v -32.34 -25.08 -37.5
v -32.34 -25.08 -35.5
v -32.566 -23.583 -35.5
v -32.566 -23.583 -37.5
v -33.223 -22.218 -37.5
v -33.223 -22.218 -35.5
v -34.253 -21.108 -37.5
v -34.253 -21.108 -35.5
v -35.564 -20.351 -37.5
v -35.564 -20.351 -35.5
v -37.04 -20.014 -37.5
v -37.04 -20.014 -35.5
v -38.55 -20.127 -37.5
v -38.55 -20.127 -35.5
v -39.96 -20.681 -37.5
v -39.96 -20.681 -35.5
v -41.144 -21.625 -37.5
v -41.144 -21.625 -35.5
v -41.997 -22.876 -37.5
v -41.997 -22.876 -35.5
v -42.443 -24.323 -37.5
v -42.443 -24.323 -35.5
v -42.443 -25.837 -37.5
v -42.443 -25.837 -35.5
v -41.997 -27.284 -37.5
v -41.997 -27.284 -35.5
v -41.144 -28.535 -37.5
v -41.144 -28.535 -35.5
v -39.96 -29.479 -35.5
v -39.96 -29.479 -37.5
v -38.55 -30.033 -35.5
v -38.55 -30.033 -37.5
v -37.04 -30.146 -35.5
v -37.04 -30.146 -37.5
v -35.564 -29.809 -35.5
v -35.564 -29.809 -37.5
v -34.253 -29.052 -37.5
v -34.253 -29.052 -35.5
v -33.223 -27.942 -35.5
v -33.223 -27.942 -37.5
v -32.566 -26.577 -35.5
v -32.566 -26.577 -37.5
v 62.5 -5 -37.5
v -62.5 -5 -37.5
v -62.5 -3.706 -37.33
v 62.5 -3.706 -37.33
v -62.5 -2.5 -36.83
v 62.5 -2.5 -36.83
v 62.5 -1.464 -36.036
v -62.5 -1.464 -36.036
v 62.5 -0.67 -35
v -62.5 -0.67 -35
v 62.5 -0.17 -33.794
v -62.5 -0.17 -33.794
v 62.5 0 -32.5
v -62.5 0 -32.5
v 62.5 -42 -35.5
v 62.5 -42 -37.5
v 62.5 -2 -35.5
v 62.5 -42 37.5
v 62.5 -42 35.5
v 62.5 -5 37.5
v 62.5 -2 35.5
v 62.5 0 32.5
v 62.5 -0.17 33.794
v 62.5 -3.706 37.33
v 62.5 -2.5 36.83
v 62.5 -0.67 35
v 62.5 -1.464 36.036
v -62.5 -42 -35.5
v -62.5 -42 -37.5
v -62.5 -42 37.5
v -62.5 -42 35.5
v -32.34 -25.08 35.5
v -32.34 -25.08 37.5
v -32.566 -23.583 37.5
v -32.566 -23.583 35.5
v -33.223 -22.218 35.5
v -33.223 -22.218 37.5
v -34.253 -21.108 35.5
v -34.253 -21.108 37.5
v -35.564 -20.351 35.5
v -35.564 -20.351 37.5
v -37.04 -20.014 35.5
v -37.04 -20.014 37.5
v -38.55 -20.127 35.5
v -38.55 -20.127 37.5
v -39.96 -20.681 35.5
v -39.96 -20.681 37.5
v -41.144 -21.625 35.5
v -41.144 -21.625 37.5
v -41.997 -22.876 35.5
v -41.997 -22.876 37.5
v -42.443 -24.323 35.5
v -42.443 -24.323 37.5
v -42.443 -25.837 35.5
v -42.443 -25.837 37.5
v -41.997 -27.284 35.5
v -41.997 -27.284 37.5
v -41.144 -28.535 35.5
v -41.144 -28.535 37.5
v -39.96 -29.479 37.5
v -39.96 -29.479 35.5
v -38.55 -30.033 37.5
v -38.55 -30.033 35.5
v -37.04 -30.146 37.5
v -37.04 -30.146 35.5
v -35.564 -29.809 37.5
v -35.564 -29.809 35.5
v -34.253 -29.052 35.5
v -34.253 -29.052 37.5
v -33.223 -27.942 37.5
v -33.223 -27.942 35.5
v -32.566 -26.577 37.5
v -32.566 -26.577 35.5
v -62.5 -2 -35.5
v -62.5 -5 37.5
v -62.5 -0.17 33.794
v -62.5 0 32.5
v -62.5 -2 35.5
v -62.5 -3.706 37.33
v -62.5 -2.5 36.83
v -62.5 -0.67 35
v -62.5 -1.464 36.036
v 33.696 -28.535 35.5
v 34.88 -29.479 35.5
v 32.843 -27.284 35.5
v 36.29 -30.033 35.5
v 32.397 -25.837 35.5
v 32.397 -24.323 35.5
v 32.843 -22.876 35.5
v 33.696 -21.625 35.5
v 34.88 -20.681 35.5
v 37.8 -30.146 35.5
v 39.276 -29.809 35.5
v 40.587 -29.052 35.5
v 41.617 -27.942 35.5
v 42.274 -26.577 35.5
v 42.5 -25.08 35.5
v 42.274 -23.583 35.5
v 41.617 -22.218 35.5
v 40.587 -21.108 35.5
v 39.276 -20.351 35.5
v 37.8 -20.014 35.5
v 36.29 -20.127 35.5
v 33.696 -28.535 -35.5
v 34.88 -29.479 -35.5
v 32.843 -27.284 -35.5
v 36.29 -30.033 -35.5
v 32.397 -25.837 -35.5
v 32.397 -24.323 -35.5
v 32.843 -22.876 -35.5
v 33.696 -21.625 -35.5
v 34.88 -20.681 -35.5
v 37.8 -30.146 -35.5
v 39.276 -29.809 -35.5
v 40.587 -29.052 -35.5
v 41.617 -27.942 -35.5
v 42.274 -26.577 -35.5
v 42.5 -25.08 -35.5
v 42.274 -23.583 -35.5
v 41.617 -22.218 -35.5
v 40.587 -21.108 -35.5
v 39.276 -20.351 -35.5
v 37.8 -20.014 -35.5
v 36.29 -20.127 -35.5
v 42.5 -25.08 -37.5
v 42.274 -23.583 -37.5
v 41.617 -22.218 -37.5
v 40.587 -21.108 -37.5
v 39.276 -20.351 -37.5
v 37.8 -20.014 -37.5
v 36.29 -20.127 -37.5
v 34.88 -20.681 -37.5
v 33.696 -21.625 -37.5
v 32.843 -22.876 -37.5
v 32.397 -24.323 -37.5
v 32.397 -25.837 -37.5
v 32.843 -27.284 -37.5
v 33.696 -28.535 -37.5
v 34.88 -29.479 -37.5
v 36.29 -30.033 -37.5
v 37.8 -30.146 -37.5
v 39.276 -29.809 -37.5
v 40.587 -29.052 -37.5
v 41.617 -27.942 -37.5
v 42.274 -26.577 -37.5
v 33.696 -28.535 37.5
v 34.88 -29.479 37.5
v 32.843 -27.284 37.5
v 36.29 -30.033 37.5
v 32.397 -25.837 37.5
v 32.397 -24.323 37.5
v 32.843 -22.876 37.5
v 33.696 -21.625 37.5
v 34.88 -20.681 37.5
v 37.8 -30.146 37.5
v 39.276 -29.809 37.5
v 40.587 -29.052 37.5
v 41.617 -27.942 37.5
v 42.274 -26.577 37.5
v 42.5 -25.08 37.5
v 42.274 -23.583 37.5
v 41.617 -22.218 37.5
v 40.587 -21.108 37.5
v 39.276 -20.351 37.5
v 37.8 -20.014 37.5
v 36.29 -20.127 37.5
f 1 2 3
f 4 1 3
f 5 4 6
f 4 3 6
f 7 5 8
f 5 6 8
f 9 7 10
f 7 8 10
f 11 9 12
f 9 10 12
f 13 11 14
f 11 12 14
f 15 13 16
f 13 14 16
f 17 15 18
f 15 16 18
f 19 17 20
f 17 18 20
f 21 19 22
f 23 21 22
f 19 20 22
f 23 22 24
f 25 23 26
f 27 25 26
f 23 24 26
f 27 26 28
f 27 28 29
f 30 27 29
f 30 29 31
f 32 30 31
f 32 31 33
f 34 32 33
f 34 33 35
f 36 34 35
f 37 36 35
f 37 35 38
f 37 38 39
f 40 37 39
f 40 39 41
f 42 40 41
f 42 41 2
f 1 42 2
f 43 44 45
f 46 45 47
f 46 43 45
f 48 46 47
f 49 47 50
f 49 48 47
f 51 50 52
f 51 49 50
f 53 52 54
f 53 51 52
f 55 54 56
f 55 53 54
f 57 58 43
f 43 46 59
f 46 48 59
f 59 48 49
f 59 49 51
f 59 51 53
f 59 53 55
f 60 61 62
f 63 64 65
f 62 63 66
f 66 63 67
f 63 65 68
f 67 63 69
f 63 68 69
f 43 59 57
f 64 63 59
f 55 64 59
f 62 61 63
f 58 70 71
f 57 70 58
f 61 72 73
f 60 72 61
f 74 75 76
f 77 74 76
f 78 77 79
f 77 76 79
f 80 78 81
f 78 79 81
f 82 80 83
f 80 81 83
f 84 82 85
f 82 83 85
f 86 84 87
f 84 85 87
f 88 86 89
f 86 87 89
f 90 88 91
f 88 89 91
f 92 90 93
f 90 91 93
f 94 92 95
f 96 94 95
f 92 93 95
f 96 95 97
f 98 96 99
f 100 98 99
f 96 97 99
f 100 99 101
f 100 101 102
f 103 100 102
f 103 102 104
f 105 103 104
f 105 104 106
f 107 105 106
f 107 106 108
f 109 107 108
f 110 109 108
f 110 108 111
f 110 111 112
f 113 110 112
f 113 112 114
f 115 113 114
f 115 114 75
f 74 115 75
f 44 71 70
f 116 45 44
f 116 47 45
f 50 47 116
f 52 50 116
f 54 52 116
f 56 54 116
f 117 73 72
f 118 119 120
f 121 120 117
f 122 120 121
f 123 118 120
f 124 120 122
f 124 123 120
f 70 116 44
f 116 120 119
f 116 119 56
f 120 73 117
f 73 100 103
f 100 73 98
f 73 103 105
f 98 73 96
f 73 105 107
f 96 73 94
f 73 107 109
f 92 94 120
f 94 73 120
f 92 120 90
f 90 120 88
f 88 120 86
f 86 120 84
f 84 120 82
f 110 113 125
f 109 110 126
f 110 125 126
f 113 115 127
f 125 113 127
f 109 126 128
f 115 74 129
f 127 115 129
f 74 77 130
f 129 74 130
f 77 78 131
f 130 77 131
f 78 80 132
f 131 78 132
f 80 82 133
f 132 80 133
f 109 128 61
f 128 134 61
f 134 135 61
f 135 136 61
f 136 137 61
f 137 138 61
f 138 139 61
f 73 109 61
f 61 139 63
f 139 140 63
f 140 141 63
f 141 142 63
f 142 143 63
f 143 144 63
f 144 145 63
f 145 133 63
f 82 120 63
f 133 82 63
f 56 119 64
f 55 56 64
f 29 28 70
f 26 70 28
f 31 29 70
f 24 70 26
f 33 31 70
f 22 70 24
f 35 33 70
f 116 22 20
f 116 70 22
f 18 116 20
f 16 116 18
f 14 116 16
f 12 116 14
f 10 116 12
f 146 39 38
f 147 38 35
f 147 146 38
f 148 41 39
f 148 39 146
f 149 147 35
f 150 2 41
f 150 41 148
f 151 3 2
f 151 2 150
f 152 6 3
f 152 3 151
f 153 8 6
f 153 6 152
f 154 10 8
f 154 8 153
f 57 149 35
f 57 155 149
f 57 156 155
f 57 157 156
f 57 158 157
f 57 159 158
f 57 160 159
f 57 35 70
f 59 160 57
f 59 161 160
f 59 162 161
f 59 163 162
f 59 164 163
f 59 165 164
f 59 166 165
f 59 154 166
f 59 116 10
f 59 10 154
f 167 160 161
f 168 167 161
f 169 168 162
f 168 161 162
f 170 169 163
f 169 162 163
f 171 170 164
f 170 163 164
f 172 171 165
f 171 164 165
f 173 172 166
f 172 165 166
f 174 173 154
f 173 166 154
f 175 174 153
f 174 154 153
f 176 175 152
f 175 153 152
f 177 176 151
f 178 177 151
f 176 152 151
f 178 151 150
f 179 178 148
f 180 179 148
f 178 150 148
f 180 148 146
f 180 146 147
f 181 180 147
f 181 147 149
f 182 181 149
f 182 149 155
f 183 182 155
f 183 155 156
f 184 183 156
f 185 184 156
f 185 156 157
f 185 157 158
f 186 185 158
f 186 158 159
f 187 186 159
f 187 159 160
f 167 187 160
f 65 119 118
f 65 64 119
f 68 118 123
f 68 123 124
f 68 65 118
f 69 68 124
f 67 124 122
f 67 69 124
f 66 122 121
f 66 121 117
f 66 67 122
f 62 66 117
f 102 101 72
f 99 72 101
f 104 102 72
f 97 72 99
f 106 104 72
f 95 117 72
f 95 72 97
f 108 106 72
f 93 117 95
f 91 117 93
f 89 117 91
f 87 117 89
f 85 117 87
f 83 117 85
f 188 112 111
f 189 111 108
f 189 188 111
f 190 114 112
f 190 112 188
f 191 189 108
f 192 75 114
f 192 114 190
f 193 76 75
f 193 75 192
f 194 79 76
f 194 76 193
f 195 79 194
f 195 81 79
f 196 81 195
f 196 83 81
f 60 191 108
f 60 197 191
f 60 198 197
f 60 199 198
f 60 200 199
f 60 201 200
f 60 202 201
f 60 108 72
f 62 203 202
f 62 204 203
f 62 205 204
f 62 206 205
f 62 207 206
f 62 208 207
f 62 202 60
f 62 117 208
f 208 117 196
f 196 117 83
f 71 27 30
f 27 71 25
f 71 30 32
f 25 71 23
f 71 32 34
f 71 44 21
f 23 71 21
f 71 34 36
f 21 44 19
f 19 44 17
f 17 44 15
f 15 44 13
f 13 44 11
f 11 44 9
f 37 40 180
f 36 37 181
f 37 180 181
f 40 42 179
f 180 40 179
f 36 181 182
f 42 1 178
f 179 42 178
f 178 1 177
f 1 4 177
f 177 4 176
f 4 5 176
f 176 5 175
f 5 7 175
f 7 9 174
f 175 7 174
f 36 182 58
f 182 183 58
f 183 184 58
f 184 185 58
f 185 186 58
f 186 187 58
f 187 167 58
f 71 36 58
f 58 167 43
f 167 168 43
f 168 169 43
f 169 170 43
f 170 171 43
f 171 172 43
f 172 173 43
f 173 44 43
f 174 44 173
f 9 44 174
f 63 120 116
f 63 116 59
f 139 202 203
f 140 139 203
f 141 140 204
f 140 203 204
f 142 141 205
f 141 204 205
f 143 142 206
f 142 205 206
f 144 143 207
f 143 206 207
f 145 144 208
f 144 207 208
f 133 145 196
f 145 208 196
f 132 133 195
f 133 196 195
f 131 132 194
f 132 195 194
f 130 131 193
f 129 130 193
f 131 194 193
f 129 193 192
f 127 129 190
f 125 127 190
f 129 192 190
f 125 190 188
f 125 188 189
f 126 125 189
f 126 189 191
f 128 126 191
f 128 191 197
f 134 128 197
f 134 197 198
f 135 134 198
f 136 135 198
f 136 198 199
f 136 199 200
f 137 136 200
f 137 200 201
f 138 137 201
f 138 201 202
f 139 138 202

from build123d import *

# Parameters (mm, degrees)
F0_W     = 125
F0_H     = 75
F1_DEPTH = 2
F2_W     = 125
F2_H     = 2
F3_DEPTH = 40
F4_R     = 5
F5_R     = 5.08
F6_DEPTH = 100


with BuildPart() as f1:
    # F0 (on Front) → F1 (new body)
    with BuildSketch(Plane.XZ):
        Rectangle(F0_W, F0_H)
    extrude(amount=F1_DEPTH)

    # F2 (on face) → F3 (join)
    with BuildSketch(Plane.XZ.offset(2)):
        with Locations((0, -36.5)):
            Rectangle(F2_W, F2_H)
        with Locations((0, 36.5)):
            Rectangle(F2_W, F2_H)
    extrude(amount=F3_DEPTH)

    # F4
    f4_edges = [f1.edges().sort_by_distance(p)[0] for p in [
        (0, 0, 37.5),
        (0, 0, -37.5),
    ]]
    fillet(f4_edges, radius=F4_R)

    # F5 (on face) → F6 (cut)
    with BuildSketch(Plane.XY.offset(37.5)):
        with Locations((37.42, -25.08)):
            Circle(F5_R)
        with Locations((-37.42, -25.08)):
            Circle(F5_R)
    extrude(amount=-F6_DEPTH, mode=Mode.SUBTRACT)


solid = f1.part
